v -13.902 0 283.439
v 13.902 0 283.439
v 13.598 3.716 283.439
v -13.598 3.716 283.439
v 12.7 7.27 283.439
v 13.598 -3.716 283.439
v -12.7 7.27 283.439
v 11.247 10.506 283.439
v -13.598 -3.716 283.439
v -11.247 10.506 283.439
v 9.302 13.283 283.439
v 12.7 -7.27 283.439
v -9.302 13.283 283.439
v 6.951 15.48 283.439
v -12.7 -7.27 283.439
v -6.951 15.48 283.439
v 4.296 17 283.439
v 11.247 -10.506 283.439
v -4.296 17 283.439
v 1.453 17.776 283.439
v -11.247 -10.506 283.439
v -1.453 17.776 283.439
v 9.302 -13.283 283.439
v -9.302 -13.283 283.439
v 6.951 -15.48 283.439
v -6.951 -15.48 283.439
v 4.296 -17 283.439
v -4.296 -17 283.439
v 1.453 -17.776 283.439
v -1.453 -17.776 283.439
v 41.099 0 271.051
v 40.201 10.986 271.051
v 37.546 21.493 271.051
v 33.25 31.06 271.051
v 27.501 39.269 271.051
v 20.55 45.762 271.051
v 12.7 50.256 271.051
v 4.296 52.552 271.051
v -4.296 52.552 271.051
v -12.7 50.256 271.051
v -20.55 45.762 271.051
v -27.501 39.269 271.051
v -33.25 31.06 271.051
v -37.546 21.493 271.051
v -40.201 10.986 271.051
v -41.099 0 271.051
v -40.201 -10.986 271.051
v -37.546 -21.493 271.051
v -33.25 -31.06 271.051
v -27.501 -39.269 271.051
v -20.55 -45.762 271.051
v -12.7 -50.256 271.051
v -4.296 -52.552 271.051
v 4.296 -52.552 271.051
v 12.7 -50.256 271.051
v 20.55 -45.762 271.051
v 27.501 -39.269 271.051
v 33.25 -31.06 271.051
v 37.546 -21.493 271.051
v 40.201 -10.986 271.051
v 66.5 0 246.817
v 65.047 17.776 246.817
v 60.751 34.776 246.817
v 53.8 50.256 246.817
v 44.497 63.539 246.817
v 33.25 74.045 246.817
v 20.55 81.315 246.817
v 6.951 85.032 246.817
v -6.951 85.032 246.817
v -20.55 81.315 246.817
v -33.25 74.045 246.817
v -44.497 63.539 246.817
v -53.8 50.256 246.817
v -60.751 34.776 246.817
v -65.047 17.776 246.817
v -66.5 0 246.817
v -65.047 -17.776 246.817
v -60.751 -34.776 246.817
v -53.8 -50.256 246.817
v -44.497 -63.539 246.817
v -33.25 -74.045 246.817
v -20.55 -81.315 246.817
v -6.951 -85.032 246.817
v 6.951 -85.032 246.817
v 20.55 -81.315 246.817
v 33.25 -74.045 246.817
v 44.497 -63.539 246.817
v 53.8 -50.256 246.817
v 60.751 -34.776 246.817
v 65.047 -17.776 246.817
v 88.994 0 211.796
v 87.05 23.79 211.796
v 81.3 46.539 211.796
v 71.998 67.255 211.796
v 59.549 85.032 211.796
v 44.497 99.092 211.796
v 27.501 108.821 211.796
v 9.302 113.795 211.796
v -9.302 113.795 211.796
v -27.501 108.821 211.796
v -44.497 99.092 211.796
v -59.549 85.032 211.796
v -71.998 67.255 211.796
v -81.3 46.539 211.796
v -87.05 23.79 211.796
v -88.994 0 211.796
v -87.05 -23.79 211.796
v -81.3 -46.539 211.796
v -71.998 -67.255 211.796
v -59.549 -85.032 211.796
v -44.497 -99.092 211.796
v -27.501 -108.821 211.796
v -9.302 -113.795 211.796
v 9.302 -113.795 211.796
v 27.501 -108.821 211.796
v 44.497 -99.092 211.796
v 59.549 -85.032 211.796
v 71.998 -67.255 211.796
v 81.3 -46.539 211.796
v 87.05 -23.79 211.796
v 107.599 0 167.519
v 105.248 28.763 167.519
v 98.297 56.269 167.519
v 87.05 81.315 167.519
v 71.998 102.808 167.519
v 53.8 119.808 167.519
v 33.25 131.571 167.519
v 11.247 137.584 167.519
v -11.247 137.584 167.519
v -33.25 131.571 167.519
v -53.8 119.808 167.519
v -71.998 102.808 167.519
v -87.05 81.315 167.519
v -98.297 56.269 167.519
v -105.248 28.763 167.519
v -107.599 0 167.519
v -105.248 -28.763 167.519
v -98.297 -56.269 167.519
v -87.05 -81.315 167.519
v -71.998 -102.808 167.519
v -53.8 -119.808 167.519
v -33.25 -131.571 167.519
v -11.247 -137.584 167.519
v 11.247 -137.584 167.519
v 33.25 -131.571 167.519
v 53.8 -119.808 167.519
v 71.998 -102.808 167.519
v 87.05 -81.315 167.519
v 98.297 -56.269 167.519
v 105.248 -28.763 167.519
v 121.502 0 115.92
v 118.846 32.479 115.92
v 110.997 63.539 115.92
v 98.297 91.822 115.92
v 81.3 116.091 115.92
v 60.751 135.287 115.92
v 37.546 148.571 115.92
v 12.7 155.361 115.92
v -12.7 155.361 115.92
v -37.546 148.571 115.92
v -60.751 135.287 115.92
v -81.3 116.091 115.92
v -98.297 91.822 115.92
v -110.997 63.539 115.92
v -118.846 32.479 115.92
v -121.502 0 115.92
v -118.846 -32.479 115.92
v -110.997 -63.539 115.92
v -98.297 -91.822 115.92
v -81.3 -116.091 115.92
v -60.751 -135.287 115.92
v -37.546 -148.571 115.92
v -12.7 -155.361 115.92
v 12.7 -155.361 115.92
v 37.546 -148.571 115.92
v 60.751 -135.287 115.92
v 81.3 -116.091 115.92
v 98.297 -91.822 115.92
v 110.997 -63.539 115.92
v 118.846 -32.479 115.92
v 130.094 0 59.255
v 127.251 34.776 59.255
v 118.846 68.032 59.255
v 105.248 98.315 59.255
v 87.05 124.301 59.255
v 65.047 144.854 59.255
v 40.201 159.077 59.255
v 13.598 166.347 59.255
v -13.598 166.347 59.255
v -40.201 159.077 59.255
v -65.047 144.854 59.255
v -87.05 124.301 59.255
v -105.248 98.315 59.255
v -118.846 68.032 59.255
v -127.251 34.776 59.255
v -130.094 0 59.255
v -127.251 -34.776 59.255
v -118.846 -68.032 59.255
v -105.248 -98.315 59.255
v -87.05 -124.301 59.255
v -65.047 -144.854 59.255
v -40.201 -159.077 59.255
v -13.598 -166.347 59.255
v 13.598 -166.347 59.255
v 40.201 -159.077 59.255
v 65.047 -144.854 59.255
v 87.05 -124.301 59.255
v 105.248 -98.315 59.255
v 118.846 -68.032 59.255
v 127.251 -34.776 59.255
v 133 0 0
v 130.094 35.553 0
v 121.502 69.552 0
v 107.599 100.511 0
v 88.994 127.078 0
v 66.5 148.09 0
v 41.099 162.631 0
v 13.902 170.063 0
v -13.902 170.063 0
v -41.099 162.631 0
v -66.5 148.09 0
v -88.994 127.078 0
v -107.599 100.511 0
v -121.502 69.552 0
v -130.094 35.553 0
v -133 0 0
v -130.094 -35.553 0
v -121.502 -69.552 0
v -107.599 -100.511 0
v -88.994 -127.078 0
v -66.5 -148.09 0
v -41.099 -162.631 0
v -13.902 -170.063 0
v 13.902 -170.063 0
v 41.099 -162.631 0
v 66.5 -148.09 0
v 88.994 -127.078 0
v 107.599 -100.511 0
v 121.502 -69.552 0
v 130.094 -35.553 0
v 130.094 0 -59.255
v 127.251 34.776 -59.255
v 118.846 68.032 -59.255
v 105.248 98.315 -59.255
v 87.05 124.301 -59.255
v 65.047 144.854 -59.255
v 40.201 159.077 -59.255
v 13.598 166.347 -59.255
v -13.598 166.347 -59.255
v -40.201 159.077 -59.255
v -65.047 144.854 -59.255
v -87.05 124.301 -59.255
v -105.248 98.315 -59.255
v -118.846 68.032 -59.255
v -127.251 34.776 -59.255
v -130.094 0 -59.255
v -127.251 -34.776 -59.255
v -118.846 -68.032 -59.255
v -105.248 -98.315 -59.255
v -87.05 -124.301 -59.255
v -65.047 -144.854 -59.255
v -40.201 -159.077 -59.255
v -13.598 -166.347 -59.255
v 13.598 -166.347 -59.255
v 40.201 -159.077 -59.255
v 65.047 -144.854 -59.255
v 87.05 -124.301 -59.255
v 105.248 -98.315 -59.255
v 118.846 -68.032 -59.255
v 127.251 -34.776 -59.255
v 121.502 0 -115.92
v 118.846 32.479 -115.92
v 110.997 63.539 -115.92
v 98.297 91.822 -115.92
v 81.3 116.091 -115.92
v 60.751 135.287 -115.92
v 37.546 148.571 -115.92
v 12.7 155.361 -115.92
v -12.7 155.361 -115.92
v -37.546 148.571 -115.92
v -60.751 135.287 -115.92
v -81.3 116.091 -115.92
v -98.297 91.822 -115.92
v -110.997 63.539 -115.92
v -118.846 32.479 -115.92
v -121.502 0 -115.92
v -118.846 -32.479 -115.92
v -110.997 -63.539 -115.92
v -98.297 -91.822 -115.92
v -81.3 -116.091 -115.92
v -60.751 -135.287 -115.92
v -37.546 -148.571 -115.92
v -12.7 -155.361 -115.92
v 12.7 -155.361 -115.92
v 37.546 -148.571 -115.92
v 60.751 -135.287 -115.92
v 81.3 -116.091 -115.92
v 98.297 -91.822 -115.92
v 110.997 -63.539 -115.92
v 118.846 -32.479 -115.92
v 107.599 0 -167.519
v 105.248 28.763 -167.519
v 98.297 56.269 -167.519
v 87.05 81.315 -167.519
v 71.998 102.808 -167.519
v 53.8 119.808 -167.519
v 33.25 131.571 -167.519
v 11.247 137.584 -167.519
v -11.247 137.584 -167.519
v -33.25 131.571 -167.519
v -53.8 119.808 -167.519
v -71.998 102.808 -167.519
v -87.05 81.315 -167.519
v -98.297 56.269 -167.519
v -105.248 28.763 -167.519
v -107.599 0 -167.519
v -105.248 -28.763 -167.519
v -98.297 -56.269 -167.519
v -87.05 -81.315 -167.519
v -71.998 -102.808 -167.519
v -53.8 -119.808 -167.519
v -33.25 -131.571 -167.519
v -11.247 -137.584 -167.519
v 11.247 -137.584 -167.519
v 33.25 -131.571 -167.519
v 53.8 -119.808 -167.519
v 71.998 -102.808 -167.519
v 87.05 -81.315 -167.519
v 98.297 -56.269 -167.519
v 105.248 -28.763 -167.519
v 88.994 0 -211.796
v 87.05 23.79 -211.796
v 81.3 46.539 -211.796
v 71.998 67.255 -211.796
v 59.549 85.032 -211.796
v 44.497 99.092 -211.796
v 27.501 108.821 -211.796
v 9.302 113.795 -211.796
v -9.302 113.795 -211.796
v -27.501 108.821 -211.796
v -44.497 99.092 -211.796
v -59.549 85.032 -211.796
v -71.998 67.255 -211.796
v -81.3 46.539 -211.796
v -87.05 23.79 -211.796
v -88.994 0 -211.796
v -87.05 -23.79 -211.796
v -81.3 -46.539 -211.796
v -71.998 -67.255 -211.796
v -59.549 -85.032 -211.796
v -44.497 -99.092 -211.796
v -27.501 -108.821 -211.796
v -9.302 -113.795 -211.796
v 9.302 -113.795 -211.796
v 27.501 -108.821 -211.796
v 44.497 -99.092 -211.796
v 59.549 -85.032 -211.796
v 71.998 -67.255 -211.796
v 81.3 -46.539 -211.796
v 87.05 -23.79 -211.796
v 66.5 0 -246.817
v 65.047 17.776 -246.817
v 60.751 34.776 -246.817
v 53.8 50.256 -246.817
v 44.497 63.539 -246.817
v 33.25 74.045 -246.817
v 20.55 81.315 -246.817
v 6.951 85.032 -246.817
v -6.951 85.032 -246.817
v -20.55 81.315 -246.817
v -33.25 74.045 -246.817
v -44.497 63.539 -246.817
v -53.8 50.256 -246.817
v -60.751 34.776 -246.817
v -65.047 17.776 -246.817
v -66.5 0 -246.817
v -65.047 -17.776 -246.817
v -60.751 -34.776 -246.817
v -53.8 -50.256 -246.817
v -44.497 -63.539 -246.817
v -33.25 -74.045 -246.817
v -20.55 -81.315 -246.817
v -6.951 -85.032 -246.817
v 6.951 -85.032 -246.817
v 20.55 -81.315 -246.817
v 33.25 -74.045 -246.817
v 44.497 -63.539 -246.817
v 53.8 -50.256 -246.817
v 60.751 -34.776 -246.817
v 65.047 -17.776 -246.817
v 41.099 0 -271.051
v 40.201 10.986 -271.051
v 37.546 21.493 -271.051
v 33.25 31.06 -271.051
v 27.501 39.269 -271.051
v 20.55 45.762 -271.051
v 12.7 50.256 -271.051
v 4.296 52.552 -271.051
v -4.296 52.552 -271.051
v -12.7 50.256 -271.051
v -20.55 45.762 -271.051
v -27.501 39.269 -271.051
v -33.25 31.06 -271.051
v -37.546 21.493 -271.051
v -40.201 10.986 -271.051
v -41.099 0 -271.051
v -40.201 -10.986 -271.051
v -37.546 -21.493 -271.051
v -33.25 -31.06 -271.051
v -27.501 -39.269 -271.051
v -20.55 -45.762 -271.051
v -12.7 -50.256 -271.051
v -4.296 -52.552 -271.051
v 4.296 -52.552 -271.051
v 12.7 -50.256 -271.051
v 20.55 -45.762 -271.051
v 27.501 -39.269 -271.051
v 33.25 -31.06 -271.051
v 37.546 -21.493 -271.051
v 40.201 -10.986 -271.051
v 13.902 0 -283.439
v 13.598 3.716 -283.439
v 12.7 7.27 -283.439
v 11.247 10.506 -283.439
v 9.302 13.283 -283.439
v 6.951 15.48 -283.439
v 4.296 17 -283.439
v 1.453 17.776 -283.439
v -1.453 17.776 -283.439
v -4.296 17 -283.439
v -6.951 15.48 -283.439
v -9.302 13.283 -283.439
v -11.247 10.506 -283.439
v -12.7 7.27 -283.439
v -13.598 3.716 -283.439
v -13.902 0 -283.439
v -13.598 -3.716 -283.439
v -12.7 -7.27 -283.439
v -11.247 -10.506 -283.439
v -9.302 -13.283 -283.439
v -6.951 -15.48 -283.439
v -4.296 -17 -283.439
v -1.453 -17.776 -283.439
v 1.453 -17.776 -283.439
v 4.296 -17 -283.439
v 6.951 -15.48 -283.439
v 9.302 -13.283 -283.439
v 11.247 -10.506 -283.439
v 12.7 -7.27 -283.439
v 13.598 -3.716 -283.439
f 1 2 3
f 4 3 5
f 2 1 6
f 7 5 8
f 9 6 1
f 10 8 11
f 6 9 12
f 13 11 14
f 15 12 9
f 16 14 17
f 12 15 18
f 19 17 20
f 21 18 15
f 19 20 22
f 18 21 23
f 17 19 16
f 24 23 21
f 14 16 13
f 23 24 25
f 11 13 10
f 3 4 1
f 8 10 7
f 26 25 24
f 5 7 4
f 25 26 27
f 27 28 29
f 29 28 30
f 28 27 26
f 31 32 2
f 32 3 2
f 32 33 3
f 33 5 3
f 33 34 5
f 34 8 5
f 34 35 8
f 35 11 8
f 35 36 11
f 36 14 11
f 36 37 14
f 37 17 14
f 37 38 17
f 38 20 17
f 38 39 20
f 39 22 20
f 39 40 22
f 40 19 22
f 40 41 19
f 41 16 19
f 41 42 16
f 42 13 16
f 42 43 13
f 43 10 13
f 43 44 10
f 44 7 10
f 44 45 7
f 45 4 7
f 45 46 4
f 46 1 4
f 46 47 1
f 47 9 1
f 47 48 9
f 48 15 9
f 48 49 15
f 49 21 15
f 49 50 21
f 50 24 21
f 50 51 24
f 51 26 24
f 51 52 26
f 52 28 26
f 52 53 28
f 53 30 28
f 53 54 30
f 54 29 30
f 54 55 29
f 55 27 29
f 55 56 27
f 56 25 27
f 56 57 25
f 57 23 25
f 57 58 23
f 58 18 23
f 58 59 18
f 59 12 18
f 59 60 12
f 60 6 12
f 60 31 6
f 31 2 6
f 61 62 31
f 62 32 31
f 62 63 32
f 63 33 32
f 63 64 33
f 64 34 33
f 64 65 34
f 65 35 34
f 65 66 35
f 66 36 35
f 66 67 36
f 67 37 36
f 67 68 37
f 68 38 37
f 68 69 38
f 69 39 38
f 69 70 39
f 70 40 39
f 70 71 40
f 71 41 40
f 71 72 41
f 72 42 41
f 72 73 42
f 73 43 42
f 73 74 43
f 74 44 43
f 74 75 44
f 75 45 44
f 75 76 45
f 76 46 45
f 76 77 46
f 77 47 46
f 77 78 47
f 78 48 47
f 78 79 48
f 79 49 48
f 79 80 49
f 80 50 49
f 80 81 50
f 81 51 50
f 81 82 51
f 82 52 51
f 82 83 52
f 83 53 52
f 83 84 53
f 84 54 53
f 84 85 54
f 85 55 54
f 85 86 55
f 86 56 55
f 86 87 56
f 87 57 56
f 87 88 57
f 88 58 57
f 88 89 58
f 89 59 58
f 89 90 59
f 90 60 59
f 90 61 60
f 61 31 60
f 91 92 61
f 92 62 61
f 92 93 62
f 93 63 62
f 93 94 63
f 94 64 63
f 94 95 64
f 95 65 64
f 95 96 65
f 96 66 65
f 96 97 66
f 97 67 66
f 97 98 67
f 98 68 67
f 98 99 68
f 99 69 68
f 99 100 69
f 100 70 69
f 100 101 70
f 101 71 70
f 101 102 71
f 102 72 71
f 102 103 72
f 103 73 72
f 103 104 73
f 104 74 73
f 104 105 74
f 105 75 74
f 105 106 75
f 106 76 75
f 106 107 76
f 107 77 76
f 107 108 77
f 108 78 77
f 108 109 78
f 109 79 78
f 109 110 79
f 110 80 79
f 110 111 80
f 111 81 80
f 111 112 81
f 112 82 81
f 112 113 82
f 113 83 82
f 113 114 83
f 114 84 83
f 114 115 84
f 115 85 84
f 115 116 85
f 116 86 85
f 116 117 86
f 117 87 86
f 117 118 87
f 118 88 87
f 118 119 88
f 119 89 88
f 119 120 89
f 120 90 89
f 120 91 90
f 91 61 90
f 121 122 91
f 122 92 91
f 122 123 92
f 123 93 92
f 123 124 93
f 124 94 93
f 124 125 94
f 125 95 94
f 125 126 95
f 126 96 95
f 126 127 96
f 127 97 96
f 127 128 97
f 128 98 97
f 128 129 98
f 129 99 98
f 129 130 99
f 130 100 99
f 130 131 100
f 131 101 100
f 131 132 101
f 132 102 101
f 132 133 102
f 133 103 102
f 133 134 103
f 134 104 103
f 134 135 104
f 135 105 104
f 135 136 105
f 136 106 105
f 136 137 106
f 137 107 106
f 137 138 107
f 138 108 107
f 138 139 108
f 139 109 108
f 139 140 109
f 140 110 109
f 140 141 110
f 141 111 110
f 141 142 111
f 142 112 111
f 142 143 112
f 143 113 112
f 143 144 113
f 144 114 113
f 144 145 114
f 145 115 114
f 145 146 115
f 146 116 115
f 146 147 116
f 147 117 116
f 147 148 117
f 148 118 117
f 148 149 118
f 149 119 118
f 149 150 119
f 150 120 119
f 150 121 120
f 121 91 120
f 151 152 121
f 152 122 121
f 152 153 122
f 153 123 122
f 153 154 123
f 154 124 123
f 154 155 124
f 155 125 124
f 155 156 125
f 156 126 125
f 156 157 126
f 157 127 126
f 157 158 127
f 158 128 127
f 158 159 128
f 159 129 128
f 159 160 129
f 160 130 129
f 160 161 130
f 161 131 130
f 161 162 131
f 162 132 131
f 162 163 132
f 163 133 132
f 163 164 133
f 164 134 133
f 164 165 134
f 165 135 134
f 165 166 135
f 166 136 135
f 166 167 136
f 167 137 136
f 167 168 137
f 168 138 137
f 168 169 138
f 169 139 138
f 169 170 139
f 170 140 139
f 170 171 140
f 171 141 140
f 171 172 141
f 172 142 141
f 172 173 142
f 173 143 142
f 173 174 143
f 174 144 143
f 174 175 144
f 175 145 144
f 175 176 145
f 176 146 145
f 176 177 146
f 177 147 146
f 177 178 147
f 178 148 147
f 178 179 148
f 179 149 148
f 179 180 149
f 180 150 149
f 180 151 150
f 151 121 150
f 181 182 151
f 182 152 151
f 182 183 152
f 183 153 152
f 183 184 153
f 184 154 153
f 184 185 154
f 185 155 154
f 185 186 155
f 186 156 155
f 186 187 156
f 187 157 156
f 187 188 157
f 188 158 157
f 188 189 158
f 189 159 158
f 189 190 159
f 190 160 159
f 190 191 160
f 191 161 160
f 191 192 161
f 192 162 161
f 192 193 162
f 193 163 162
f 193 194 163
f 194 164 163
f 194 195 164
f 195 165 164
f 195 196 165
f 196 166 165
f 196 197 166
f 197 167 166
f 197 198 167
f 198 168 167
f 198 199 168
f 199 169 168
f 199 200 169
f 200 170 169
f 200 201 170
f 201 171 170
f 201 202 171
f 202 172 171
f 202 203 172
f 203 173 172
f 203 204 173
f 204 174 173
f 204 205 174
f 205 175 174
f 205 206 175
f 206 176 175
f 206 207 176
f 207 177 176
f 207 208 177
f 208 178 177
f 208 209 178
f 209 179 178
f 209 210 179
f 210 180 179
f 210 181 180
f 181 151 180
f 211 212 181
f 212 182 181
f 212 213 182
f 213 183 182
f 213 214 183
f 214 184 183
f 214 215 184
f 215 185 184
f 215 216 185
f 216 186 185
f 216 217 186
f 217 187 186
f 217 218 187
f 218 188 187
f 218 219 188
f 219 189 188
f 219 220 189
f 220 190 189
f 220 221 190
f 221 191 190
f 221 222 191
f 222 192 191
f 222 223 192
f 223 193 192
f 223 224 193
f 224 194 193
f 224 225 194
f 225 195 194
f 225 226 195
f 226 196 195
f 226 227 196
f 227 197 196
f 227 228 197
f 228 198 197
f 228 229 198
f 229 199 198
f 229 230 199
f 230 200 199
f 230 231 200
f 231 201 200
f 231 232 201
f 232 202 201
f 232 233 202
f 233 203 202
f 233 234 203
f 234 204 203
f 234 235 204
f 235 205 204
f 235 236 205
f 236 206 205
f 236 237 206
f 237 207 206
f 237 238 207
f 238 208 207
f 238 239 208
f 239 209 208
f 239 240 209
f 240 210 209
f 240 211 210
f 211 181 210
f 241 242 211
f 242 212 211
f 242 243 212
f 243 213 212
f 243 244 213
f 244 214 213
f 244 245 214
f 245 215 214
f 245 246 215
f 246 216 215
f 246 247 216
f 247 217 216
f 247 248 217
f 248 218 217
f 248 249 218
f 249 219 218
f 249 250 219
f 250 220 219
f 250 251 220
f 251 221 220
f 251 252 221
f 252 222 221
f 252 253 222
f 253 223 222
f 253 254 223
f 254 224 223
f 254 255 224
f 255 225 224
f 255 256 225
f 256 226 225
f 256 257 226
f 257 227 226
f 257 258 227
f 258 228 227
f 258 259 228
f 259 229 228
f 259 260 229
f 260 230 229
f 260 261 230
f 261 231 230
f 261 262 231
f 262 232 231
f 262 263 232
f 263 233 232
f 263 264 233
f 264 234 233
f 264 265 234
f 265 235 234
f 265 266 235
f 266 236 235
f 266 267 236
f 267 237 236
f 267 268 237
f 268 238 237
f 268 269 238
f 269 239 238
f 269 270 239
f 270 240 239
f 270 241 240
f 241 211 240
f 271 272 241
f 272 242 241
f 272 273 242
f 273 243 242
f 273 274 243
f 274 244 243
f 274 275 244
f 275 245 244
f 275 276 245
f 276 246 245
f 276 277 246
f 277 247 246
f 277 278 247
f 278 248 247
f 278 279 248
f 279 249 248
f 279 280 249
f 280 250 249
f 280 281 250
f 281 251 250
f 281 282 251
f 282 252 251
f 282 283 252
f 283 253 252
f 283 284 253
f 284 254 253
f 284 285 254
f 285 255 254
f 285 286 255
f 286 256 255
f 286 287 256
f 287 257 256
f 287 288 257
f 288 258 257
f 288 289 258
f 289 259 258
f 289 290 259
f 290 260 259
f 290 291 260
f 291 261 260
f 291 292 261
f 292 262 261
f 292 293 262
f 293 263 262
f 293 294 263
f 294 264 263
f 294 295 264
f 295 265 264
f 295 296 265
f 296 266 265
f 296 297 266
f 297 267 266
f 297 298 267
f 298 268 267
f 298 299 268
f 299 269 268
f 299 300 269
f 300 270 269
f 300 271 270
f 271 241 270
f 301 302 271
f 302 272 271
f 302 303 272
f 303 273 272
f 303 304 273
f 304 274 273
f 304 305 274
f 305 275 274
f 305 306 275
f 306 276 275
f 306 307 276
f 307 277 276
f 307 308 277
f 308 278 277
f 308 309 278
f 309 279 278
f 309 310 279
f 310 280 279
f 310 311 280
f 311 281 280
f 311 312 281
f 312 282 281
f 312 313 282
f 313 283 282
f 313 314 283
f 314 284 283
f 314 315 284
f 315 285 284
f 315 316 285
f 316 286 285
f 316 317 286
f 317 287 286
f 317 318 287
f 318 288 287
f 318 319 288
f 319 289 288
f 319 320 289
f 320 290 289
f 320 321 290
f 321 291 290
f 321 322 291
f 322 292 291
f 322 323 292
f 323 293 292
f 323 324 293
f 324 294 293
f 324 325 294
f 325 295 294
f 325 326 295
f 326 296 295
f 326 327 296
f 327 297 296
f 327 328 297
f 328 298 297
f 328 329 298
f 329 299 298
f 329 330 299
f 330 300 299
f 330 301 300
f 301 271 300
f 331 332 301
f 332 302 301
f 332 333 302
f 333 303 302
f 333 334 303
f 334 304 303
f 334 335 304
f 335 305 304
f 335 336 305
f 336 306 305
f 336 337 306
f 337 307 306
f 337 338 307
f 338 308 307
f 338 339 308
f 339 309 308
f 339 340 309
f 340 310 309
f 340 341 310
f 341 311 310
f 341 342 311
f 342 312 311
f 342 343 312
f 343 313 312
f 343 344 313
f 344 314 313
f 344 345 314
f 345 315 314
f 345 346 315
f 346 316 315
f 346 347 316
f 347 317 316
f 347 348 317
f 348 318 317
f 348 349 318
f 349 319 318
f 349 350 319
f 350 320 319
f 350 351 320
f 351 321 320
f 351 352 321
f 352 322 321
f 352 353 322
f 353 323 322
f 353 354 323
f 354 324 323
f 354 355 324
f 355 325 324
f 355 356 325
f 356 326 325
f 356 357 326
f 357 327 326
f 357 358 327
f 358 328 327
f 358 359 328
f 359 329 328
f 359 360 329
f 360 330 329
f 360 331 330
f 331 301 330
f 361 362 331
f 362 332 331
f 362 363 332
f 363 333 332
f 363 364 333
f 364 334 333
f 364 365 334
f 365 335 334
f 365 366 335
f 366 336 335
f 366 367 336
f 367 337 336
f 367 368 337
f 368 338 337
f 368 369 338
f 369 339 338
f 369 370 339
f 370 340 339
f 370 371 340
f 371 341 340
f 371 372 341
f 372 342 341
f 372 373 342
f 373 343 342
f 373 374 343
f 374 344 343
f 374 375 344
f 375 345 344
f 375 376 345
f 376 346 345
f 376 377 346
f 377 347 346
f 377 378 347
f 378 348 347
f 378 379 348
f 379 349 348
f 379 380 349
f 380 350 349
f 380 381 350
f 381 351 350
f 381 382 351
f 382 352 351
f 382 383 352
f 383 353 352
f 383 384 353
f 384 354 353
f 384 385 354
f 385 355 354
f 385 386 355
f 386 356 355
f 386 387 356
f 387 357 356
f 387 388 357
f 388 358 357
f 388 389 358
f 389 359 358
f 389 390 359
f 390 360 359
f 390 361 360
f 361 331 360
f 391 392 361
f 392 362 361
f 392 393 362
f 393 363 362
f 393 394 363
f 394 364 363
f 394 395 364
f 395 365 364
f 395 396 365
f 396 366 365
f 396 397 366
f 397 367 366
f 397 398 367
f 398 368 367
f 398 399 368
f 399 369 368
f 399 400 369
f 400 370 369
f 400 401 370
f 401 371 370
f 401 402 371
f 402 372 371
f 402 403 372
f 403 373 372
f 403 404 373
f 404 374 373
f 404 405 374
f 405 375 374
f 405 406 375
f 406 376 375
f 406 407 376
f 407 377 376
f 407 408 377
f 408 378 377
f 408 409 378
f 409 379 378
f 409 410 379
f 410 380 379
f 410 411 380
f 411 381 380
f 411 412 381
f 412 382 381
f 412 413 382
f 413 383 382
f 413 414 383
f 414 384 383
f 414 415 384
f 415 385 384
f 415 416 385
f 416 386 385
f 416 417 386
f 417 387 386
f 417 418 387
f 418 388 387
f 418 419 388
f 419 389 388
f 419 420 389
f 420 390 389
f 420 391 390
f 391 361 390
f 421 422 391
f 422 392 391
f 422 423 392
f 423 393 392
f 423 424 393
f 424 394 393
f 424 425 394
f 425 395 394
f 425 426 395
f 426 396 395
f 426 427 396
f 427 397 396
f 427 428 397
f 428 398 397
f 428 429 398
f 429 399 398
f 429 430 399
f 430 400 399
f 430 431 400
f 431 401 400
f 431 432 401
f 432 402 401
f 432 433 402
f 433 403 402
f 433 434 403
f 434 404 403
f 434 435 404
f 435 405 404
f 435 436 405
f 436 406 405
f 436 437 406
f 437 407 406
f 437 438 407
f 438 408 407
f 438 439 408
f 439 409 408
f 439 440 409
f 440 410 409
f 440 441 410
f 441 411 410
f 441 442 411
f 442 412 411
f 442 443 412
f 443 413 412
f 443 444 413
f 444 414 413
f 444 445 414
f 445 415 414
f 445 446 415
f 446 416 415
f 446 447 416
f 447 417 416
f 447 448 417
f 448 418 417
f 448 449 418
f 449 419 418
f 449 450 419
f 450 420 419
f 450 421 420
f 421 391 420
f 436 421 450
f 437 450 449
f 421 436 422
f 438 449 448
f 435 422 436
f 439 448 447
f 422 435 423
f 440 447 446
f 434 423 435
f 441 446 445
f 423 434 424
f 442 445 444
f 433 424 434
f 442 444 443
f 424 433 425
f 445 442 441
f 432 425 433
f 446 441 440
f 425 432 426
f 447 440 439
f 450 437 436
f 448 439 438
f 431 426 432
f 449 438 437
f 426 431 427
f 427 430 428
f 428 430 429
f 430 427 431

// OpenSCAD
// Generated by SolidPython 1.0.1 on 2020-07-29 00:46:47


scale(v = [7, 9, 15]) {
	sphere(r = 19);
}
/***********************************************
*********      SolidPython code:      **********
************************************************
 
# import packages: SolidPython
from solid import *
from solid.utils import *
from itertools import chain, combinations, permutations


class Resize:

    def __init__(self, scad_file):
        self.scad_file = scad_file
        #self.scad_file = import_scad(scad_file)
        # cone/cylinder param:
        self.r1 = 0
        self.r2 = 0
        self.h = 0
        # rectangular prism param:
        self.w = 0
        self.l = 0
        # ellipse param:
        self.r = 0

    # import OpenScad code (file name corresponds to shape)


    # classify shape + parameters
    def assign(self, param1, param2, param3):
        if self.scad_file == 'cone.scad':
            self.r1 = param1
            self.r2 = param2
            self.h = param3
        elif self.scad_file == 'cylinder.scad':
            self.r1 = param1
            self.r2 = param2
            self.h = param3
        elif self.scad_file == 'rectangularPrism.scad':
            self.h = param1
            self.l = param2
            self.w = param3
        else:
            self.r = param1
            self.h = param2

    # resize parameters
    def iterate(self):
        x = range(3, 20, 2)
        i = 1
        if self.scad_file == 'cone.scad':
            tempList = list(permutations(x, 2))
            for temp in tempList:
                param1 = temp[0]
                param2 = temp[1]
                filepath = 'produced_scad_files/' + 'cone' + str(param1) + '_' + str(param2) + '_' + '.scad'
                scad_render_to_file(cylinder(h=param1, r1=param2, r2=0), filepath)

        elif self.scad_file == 'cylinder.scad':
            tempList = list(permutations(x, 3))
            for temp in tempList:
                param1 = temp[0]
                param2 = temp[1]
                filepath = 'produced_scad_files/' + 'cylinder' + str(param1) + '_' + str(param2) + '_' + '.scad'
                scad_render_to_file(cylinder(h=param1, r1=param2, r2=param2), filepath)

        elif self.scad_file == 'rectangularPrism.scad':
            tempList = list(permutations(x, 3))
            for temp in tempList:
                param1 = temp[0]
                param2 = temp[1]
                param3 = temp[2]
                filepath = 'produced_scad_files/' + 'rectangularPrism' + str(param1) + '_' + str(param2) + '_' + str(
                    param3) + '.scad'
                scad_render_to_file(cube(size=(param1, param2, param3)), filepath)

        elif self.scad_file == 'ellipse.scad':
            tempList = list(permutations(x, 4))
            for temp in tempList:
                param1 = temp[0]
                param2 = temp[1]
                param3 = temp[2]
                param4 = temp[3]
                filepath = 'produced_scad_files/' + 'ellipse' + str(param1) + '_' + str(param2) + '_' + str(param3) + '_' + str(param4) + '.scad'
                scad_render_to_file(scale([param1, param2, param3])(sphere(r=param4)), filepath)

    def render_to_scadfile(self):
        scad_render_to_file(scad, 'example.scad') 
 
************************************************/
